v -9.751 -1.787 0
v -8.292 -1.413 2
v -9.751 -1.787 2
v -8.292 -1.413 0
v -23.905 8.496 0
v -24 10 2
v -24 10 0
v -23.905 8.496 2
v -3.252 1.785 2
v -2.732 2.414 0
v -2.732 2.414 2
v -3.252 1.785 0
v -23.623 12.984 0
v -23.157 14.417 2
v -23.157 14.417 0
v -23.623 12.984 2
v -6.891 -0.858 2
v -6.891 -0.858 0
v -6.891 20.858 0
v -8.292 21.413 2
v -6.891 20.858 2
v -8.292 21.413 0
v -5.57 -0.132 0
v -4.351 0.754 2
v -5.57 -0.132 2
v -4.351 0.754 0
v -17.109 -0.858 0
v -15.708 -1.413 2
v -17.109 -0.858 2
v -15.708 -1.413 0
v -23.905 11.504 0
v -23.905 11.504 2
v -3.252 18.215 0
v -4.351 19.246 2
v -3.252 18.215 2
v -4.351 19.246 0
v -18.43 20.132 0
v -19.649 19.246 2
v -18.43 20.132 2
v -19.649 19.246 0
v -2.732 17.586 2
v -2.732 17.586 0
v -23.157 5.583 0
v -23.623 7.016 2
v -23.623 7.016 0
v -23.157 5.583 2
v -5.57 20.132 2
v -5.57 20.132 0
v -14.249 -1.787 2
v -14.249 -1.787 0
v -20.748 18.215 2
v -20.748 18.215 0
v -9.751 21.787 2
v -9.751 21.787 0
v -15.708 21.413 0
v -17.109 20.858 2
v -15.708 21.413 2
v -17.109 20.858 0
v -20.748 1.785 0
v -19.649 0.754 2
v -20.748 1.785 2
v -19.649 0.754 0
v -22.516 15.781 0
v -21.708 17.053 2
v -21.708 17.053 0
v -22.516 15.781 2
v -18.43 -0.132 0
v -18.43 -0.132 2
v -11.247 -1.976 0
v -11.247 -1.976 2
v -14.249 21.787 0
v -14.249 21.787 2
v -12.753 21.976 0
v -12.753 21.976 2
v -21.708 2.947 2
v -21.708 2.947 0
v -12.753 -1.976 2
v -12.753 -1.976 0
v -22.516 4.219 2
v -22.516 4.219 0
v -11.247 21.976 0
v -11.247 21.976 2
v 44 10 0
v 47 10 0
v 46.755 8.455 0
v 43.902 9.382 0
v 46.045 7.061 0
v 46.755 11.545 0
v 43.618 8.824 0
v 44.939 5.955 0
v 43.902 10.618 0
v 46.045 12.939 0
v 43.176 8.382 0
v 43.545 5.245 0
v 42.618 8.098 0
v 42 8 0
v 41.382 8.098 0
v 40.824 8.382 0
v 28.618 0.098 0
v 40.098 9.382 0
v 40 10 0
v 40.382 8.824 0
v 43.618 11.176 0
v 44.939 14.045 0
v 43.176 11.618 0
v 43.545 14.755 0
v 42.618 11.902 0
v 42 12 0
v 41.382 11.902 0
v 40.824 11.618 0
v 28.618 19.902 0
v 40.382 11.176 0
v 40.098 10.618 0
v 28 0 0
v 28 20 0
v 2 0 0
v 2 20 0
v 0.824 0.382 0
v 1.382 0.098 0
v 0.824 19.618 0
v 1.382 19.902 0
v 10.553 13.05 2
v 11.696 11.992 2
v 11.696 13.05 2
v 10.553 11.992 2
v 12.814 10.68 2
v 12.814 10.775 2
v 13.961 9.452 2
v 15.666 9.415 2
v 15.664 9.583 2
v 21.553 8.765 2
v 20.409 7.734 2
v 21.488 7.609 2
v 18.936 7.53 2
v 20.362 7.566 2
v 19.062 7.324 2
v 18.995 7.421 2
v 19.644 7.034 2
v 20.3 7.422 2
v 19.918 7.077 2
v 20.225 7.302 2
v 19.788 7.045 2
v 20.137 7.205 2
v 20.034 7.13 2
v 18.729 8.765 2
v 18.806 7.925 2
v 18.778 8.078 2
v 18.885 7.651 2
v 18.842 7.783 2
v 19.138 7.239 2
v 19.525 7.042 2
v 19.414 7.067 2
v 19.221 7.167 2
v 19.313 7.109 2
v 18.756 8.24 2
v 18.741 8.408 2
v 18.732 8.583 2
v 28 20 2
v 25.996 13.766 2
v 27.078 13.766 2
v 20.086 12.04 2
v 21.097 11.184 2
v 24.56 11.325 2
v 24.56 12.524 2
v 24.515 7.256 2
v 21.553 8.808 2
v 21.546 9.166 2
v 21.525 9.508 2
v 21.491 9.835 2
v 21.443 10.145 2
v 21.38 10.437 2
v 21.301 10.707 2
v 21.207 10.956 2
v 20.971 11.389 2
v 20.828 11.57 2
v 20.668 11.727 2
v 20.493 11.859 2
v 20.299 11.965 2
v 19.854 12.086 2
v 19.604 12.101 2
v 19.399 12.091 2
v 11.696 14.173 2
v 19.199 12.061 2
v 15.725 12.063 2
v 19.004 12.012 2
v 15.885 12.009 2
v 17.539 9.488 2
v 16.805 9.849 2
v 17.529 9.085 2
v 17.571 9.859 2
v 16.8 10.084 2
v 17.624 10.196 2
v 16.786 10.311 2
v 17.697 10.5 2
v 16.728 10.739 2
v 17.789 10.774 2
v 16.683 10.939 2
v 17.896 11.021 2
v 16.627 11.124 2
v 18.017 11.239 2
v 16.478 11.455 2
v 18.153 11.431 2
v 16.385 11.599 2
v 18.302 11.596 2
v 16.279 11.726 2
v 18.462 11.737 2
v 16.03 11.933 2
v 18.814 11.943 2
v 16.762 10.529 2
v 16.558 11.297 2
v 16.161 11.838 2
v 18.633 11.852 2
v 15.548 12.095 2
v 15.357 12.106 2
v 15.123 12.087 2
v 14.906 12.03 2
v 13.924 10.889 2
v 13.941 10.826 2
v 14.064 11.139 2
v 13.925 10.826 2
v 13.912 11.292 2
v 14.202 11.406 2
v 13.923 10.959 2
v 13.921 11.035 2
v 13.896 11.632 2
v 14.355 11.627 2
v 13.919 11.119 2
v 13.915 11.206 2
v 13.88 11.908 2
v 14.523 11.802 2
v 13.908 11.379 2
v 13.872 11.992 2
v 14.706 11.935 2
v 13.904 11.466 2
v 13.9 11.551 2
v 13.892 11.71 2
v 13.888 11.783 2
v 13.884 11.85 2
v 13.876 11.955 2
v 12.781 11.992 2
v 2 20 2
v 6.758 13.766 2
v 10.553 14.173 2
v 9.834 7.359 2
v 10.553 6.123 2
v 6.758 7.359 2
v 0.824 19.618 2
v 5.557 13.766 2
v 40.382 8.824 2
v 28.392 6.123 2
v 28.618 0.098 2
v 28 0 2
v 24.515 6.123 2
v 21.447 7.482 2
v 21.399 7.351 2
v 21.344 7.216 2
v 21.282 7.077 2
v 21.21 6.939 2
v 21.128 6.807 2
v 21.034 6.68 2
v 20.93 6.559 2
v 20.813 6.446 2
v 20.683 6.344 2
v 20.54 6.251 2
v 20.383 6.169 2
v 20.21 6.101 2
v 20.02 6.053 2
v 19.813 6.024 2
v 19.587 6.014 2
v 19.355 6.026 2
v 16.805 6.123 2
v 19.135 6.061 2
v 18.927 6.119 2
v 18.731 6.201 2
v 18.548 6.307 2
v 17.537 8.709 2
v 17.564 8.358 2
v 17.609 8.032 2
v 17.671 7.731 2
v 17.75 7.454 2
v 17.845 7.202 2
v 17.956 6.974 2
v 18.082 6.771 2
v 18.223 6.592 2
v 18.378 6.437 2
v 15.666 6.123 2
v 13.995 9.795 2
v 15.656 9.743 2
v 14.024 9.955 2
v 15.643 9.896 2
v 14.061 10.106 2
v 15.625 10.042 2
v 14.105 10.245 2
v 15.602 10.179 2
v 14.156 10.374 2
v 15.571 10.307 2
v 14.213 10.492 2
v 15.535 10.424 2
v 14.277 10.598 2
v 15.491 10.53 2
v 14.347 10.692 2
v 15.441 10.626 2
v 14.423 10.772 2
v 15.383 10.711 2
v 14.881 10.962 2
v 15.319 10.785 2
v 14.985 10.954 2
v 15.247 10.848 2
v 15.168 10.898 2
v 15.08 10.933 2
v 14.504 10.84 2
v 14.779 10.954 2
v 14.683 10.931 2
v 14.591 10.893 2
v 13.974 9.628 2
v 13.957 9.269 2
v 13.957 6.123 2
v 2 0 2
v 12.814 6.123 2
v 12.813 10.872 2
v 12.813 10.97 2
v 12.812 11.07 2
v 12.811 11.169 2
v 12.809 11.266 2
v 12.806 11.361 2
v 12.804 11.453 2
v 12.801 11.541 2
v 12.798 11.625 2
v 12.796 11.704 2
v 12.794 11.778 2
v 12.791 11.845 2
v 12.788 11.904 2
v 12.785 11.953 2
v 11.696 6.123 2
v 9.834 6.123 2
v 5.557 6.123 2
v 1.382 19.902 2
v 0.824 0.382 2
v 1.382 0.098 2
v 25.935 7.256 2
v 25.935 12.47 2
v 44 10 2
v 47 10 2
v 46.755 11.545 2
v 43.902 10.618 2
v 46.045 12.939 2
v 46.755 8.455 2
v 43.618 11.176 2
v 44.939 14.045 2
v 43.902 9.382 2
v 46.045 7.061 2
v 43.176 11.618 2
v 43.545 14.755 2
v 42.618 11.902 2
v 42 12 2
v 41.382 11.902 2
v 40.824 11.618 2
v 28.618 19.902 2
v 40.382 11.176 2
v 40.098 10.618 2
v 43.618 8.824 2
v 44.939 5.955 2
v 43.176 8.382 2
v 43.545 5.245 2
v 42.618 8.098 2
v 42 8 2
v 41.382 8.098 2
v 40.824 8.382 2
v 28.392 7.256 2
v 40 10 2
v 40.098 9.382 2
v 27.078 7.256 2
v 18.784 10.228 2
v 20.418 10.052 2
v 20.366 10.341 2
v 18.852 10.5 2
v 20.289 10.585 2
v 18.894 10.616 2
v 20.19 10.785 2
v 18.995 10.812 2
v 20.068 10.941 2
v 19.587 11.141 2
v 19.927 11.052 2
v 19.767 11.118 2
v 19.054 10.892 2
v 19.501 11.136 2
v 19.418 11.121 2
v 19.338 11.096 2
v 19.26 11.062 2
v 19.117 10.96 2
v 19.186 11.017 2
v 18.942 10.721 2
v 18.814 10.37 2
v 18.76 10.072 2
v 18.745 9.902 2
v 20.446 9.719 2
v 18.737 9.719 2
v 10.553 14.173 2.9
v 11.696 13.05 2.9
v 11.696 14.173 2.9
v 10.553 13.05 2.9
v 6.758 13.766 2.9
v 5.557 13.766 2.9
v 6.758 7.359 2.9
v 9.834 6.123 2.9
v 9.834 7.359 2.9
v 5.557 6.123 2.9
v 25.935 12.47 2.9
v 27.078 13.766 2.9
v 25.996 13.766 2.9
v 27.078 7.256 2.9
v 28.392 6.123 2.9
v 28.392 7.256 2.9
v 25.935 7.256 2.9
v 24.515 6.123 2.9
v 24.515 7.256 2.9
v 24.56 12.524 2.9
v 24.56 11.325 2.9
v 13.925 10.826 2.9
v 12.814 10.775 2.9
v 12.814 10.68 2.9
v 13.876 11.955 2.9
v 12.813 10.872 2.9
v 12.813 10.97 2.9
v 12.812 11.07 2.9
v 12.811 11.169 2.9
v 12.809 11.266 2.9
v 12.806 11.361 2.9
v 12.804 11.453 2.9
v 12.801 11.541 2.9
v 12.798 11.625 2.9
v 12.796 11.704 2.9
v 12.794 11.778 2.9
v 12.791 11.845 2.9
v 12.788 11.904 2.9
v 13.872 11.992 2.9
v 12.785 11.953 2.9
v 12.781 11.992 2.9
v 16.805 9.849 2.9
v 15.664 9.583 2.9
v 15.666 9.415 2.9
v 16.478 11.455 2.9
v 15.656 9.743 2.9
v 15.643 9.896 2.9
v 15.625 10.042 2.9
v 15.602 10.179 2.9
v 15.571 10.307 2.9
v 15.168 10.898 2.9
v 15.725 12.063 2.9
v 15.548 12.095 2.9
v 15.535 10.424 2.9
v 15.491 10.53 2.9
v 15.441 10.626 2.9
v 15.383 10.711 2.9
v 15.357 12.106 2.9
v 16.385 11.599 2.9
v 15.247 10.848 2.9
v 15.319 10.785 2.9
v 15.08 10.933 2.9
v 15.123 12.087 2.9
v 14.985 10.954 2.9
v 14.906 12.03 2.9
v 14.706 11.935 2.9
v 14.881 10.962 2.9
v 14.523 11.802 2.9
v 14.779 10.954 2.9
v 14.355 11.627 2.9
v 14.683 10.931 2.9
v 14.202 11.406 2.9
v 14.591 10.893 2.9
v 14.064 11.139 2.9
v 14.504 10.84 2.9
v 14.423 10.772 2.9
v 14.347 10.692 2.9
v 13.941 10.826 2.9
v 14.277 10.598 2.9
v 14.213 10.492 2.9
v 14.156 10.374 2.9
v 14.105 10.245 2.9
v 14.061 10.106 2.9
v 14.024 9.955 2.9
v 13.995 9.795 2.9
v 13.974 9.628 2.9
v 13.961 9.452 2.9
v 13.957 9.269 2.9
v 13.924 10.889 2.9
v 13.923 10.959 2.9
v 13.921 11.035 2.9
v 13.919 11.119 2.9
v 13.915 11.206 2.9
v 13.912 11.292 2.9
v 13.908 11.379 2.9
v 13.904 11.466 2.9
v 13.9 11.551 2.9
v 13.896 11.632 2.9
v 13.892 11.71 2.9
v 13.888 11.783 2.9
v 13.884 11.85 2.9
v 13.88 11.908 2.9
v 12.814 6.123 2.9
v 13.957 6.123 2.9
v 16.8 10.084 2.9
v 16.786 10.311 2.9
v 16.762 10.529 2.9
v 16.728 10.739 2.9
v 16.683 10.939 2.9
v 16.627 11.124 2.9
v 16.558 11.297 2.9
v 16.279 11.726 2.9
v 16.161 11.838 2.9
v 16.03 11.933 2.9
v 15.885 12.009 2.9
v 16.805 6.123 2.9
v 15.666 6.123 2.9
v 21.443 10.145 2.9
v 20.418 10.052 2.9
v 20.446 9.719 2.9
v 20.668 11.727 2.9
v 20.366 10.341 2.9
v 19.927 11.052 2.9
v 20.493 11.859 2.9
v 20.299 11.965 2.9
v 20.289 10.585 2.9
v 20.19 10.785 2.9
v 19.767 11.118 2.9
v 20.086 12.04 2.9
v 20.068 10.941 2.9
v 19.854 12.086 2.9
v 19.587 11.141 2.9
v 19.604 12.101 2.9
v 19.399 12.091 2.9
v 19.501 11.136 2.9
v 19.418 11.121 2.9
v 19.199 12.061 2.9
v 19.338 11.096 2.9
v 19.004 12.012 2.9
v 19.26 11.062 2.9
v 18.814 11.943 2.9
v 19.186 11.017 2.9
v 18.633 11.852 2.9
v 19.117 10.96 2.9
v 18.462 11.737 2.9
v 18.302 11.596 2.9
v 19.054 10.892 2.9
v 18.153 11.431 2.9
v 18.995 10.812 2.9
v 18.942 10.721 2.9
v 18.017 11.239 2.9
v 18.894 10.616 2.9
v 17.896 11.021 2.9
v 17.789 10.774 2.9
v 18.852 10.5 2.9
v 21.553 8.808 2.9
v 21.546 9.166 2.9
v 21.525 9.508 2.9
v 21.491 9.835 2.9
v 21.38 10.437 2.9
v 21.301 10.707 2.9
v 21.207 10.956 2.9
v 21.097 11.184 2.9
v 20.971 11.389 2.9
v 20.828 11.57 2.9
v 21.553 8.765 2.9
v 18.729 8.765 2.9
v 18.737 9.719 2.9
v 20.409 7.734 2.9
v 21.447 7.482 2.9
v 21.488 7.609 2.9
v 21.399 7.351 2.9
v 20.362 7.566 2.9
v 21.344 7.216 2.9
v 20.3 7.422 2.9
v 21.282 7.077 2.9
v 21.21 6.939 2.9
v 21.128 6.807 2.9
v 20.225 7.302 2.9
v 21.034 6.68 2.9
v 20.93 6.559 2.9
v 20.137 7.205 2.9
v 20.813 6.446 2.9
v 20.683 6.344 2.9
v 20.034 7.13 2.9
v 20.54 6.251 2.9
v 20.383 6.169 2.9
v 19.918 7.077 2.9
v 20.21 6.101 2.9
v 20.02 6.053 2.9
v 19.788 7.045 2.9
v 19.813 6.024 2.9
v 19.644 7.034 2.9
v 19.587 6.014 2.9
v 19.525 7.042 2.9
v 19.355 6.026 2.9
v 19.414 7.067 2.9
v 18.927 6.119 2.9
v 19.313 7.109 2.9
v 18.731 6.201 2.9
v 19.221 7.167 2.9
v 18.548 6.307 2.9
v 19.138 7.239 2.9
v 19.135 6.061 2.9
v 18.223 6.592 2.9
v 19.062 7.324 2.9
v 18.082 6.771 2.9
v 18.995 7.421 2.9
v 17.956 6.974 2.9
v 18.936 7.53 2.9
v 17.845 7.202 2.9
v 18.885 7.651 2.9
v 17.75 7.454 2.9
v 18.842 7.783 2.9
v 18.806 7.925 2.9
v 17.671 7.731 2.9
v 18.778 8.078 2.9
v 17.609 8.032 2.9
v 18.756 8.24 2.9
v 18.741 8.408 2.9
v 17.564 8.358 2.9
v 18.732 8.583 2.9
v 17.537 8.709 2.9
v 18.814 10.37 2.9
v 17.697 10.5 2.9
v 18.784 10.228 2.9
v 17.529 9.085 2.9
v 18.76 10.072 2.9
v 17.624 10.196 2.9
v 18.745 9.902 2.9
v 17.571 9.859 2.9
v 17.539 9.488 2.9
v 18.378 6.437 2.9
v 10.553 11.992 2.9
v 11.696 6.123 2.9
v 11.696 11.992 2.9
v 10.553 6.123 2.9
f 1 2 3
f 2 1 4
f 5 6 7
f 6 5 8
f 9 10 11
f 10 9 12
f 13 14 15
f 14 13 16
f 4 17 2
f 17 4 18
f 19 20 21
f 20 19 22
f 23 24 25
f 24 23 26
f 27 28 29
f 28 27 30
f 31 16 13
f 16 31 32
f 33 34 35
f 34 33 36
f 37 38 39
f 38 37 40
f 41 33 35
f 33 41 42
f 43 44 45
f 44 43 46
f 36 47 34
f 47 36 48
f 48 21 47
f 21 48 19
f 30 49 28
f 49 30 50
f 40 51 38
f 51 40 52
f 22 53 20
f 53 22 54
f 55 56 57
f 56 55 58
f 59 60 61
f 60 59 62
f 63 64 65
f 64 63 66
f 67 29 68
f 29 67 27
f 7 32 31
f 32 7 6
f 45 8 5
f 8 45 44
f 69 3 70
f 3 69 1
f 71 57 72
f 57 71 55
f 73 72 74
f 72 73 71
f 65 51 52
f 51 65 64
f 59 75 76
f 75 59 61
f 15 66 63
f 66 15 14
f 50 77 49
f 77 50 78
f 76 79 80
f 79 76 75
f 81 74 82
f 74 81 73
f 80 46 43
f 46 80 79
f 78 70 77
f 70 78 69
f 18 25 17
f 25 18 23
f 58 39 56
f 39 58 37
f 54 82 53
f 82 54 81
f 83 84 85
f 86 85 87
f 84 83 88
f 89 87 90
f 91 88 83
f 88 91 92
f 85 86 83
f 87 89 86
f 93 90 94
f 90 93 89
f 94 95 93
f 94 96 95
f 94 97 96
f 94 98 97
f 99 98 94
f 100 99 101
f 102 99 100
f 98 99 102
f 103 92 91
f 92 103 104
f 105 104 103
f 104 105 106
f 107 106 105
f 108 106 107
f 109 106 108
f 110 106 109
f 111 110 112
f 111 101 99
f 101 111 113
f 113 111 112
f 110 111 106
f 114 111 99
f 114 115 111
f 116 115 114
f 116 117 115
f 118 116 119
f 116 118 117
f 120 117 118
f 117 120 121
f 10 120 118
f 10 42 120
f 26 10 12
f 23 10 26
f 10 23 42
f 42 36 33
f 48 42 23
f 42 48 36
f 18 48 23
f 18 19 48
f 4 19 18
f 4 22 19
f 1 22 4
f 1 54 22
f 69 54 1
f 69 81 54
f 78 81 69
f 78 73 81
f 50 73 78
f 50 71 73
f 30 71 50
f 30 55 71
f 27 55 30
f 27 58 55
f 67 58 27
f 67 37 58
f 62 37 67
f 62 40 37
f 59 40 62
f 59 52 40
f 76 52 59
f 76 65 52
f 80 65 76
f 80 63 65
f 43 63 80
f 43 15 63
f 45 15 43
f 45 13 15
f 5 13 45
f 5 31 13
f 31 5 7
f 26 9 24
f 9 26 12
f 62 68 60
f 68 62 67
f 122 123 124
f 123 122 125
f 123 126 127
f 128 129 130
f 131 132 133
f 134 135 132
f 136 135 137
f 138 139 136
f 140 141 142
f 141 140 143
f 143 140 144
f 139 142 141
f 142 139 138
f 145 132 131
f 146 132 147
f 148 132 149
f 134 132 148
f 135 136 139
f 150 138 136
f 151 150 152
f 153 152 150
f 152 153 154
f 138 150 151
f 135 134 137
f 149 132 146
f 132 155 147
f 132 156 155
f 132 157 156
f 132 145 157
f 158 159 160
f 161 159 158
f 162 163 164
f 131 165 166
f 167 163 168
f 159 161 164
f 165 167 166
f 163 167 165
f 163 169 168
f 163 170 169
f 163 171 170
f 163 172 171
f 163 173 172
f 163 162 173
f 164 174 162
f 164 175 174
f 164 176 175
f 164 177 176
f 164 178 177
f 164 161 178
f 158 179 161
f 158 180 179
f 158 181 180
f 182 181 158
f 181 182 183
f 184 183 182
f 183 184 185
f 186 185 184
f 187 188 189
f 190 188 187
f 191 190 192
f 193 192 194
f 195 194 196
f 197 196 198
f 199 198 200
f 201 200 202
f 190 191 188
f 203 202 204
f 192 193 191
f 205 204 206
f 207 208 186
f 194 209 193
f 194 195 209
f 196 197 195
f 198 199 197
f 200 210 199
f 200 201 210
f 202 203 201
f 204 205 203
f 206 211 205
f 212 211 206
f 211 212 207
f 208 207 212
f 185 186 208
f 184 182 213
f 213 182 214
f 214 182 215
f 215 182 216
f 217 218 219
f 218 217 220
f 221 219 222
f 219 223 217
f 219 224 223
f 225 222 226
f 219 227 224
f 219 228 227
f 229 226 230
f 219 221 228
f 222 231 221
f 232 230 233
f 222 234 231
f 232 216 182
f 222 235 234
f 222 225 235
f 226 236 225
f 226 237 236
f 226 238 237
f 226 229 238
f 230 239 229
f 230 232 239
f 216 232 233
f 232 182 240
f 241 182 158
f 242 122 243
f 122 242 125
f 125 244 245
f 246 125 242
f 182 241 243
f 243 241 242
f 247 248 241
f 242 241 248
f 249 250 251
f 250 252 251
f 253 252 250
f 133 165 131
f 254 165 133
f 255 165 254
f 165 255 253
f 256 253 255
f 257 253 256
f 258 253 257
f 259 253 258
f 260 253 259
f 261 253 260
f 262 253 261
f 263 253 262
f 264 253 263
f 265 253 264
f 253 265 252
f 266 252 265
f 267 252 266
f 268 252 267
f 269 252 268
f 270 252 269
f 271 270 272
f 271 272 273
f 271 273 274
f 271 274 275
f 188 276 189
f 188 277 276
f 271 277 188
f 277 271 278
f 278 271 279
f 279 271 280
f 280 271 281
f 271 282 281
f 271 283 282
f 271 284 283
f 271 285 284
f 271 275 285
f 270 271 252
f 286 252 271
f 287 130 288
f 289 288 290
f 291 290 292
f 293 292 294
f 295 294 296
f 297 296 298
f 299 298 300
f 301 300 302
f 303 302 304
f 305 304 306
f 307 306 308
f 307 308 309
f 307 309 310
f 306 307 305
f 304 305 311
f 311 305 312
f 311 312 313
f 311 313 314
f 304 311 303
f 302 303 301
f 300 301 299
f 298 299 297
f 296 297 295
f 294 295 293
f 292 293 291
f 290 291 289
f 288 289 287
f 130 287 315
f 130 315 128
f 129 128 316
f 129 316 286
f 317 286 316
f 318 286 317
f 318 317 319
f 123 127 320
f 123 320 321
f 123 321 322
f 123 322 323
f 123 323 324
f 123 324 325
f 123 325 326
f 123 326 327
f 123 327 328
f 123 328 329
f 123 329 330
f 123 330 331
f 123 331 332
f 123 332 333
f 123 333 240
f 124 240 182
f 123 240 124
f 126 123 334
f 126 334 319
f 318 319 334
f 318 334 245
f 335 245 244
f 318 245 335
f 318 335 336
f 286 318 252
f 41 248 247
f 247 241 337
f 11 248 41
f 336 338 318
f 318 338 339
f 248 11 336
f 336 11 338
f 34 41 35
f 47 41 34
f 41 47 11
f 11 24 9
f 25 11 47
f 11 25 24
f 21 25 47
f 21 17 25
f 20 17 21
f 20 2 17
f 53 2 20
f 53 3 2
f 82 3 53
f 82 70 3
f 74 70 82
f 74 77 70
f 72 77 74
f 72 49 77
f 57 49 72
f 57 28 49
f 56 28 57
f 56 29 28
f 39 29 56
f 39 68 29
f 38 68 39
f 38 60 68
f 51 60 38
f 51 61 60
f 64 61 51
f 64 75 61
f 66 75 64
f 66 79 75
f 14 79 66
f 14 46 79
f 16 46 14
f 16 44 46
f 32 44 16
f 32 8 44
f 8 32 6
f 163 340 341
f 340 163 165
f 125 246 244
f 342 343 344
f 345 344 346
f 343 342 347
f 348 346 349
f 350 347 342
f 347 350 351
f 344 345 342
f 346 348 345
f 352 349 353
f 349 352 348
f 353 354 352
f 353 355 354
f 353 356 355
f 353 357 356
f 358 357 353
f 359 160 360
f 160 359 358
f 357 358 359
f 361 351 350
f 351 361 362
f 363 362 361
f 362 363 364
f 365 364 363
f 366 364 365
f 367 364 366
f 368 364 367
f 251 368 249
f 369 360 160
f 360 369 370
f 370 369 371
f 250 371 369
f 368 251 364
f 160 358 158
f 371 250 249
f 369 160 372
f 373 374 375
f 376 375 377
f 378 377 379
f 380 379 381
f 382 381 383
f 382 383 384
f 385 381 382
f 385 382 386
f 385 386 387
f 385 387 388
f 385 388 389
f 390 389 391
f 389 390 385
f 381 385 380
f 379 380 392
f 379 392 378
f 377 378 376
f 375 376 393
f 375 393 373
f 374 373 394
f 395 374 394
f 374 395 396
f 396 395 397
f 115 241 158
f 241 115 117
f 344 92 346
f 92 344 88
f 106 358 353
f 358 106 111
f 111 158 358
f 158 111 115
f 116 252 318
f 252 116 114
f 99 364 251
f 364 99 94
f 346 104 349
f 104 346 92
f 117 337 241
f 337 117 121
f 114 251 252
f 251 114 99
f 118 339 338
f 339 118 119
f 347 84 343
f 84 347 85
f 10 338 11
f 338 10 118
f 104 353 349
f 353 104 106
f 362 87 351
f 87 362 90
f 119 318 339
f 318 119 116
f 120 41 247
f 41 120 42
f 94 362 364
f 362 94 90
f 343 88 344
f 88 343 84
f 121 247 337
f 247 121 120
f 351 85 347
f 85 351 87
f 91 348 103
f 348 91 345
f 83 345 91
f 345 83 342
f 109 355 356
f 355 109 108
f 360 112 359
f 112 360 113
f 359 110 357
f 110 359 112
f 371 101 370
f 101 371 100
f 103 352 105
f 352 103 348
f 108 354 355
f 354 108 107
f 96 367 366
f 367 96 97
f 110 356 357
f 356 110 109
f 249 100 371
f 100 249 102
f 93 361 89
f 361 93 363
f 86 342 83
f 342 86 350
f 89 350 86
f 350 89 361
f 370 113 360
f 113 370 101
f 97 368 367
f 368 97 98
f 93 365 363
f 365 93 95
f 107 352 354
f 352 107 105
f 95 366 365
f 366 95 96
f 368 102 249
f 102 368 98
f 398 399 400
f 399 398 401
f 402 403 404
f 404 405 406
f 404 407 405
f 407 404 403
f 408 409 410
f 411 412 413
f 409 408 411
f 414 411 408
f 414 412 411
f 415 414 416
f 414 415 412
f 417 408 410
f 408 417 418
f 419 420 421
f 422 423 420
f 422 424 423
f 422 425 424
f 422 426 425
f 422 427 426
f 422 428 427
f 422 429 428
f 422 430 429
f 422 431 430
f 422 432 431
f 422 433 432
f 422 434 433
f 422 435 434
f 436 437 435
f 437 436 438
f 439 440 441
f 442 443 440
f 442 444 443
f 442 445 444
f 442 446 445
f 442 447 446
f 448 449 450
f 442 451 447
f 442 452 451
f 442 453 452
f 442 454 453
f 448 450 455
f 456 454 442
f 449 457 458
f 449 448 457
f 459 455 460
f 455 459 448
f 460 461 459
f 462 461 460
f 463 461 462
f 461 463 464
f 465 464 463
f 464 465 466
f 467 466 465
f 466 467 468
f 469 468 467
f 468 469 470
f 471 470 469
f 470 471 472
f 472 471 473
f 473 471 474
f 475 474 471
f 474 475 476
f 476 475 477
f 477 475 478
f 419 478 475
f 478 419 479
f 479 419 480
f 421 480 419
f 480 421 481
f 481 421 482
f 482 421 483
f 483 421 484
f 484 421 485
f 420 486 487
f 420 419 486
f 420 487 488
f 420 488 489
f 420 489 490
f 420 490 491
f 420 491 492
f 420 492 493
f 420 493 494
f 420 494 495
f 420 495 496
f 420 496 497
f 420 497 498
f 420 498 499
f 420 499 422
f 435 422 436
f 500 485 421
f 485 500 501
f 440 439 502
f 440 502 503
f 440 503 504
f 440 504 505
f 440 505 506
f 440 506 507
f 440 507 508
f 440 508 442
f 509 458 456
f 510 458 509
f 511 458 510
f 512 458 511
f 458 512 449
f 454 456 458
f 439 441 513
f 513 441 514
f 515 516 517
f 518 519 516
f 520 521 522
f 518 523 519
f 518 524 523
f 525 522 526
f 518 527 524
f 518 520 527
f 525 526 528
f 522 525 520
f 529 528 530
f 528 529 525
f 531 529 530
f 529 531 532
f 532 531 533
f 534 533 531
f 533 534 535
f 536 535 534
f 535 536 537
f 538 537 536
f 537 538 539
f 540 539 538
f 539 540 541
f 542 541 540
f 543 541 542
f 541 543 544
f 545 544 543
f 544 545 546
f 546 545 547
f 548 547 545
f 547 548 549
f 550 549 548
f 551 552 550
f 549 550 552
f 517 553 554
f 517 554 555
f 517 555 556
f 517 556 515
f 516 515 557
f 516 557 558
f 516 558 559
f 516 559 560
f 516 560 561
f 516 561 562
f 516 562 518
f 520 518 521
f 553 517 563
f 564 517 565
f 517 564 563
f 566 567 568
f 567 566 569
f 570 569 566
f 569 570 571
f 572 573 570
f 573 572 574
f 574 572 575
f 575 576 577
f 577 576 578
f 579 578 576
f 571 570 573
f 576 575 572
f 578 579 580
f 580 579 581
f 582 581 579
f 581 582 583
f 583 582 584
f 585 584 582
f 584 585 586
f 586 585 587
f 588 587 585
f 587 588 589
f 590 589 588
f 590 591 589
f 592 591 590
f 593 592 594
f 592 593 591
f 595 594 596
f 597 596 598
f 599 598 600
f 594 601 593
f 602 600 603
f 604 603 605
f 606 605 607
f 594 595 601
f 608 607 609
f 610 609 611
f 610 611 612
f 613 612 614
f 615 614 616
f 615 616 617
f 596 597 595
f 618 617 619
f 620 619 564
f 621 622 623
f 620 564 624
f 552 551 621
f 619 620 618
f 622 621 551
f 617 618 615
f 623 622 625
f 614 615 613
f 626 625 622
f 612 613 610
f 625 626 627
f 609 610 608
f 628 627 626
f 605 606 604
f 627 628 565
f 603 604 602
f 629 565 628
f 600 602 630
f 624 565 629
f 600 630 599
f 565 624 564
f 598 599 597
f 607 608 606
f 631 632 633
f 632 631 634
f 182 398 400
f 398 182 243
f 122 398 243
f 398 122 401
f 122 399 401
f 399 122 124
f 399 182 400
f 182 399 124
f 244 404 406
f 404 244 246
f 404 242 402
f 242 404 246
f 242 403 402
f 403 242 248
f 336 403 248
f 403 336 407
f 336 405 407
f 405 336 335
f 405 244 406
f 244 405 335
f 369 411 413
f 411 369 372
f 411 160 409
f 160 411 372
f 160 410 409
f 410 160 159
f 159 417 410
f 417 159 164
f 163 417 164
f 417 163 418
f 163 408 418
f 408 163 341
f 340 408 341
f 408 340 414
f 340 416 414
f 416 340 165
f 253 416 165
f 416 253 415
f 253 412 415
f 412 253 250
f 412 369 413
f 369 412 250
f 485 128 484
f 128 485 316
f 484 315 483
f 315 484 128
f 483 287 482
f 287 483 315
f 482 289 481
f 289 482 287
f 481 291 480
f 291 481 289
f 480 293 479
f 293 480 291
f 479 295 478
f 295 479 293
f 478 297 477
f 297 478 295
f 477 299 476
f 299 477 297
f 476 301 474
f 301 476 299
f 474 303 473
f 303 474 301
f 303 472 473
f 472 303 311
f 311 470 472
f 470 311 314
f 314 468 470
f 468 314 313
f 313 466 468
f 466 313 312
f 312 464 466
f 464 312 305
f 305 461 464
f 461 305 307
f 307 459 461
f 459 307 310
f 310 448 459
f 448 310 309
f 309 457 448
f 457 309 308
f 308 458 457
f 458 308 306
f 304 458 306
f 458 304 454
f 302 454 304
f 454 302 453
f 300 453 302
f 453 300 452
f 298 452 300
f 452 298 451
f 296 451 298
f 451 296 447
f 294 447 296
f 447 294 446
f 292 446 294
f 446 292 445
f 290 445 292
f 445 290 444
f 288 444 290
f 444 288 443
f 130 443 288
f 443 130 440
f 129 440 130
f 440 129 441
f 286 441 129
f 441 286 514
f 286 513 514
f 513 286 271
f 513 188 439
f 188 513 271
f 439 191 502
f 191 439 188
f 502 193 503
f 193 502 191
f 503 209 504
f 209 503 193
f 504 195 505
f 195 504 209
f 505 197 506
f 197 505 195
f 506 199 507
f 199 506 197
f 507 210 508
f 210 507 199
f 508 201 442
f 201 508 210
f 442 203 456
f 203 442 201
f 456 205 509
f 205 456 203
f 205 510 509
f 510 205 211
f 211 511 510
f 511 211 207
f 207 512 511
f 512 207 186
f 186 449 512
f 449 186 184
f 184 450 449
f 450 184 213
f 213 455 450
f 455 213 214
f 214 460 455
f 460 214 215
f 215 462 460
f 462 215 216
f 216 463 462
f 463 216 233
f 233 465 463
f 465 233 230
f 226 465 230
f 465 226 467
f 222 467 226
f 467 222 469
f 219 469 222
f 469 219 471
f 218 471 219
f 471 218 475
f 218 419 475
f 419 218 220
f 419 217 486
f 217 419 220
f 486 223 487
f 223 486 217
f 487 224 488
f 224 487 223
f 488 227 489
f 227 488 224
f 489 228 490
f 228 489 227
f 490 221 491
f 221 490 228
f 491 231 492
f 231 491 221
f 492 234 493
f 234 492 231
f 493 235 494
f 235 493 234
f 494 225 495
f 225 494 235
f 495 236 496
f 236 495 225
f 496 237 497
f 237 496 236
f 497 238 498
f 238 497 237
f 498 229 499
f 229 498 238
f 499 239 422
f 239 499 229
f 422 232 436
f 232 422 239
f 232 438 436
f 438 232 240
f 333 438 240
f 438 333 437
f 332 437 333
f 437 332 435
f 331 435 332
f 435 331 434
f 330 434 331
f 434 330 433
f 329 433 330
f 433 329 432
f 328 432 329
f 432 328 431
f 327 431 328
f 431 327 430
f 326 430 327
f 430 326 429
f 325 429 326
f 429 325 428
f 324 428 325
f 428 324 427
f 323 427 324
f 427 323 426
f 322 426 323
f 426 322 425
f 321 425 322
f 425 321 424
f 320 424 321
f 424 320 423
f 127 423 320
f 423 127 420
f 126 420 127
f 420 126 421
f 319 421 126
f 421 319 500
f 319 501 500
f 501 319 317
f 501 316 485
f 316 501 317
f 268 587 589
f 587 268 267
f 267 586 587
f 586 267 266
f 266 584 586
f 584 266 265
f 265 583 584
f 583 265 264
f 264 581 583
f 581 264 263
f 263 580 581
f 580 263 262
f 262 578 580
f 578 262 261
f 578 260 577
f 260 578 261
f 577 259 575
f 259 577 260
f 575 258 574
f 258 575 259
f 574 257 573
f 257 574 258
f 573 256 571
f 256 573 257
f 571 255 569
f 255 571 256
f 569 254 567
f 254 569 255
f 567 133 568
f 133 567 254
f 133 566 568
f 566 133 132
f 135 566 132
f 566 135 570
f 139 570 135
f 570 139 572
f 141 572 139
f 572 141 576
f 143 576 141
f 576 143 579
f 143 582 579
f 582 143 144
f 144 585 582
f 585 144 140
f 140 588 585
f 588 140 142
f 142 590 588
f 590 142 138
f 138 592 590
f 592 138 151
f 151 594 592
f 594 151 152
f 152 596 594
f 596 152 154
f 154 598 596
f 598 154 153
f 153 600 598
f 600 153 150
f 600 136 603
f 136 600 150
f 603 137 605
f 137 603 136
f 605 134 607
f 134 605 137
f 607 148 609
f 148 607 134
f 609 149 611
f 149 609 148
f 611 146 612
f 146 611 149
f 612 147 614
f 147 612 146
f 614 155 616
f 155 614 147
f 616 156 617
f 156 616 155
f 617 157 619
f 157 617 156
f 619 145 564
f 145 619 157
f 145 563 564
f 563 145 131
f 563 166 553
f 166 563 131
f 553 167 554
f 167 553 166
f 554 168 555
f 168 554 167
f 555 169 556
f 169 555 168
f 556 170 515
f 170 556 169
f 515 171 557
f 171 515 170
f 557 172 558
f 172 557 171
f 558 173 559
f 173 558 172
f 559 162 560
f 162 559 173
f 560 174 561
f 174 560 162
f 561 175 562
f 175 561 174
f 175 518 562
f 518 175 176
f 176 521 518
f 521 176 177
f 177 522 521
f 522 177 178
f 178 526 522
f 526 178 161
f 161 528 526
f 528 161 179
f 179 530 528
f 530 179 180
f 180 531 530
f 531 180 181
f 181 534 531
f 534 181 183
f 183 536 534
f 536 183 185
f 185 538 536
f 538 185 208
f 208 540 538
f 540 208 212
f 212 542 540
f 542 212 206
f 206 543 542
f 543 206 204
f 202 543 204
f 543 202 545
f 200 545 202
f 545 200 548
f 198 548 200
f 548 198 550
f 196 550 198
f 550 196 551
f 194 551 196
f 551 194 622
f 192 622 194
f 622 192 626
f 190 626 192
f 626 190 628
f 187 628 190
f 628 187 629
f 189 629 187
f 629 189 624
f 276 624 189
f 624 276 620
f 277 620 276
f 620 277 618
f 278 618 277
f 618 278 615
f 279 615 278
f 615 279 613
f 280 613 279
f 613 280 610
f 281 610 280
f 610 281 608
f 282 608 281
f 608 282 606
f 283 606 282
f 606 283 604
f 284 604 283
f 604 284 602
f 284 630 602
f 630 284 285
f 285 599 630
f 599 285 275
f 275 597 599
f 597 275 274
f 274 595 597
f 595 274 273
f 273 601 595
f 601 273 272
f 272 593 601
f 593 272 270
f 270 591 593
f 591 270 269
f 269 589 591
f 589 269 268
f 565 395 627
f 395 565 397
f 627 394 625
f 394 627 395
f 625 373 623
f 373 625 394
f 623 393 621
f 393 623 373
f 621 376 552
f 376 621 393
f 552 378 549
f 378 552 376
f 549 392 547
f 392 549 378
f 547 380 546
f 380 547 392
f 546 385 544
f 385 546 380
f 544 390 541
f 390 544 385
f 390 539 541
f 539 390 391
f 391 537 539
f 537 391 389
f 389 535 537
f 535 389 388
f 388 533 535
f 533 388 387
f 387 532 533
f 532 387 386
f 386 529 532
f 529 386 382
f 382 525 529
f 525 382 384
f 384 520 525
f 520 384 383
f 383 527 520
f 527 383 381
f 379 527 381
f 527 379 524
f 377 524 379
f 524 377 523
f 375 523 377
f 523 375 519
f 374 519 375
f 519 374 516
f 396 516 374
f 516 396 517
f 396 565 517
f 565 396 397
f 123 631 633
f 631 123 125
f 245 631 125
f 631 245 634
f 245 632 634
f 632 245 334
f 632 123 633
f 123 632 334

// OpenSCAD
width = 20;
length1 = 30; // Defaults to 30 for mode 1 and 20 for mode 2
length2 = length1 + 12;
height = 2;
text_height = 1;
radius = 2;
radius2 = 5;
radius_coin = 12;
line1 = "Line 1";
text_scale = 0.8; // Defaults to 0.8
text_scale_width = 0.6; // Defaults to 0.6 
font="Liberation Sans:style=bold";
mode = 1; // 1 = add, 2 = sub

difference() {
    union()
    {
        // coin
        translate([-radius_coin,width / 2,0]) cylinder(height, radius_coin, radius_coin, $fn=50);
        // body
        hull() {
            translate([-radius_coin,width / 2,0]) cylinder(height, radius, radius, $fn=20);
            translate([radius,radius,0]) cylinder(height, radius, radius, $fn=20);
            translate([radius,width-radius,0]) cylinder(height, radius, radius, $fn=20);
            translate([length1-radius,radius,0]) cylinder(height, radius, radius, $fn=20);
            translate([length1-radius,width-radius,0]) cylinder(height, radius, radius, $fn=20);
            // outer cylinder for keyring
            translate([length2,width / 2,0]) cylinder(height, radius2, radius2, $fn=20);
        }
    }
    // Cut out hole for key ring
    translate([length2,width / 2,0]) cylinder(10, radius, radius, true, $fn=20);
    if(mode == 2) {
        // Text for mode 2
        translate([-radius_coin*1.2,width/2,1]) linear_extrude(height = height+1) {
            scale([text_scale_width, text_scale, text_scale]) text(line1, valign = "center", font=font);
        }
    }
}
if(mode == 1) {
    // Text for mode 1
    translate([5,width/2,height-0.1]) linear_extrude(height = text_height) {
        scale([text_scale_width, text_scale, text_scale]) text(line1, valign = "center", font=font);
    }
}
